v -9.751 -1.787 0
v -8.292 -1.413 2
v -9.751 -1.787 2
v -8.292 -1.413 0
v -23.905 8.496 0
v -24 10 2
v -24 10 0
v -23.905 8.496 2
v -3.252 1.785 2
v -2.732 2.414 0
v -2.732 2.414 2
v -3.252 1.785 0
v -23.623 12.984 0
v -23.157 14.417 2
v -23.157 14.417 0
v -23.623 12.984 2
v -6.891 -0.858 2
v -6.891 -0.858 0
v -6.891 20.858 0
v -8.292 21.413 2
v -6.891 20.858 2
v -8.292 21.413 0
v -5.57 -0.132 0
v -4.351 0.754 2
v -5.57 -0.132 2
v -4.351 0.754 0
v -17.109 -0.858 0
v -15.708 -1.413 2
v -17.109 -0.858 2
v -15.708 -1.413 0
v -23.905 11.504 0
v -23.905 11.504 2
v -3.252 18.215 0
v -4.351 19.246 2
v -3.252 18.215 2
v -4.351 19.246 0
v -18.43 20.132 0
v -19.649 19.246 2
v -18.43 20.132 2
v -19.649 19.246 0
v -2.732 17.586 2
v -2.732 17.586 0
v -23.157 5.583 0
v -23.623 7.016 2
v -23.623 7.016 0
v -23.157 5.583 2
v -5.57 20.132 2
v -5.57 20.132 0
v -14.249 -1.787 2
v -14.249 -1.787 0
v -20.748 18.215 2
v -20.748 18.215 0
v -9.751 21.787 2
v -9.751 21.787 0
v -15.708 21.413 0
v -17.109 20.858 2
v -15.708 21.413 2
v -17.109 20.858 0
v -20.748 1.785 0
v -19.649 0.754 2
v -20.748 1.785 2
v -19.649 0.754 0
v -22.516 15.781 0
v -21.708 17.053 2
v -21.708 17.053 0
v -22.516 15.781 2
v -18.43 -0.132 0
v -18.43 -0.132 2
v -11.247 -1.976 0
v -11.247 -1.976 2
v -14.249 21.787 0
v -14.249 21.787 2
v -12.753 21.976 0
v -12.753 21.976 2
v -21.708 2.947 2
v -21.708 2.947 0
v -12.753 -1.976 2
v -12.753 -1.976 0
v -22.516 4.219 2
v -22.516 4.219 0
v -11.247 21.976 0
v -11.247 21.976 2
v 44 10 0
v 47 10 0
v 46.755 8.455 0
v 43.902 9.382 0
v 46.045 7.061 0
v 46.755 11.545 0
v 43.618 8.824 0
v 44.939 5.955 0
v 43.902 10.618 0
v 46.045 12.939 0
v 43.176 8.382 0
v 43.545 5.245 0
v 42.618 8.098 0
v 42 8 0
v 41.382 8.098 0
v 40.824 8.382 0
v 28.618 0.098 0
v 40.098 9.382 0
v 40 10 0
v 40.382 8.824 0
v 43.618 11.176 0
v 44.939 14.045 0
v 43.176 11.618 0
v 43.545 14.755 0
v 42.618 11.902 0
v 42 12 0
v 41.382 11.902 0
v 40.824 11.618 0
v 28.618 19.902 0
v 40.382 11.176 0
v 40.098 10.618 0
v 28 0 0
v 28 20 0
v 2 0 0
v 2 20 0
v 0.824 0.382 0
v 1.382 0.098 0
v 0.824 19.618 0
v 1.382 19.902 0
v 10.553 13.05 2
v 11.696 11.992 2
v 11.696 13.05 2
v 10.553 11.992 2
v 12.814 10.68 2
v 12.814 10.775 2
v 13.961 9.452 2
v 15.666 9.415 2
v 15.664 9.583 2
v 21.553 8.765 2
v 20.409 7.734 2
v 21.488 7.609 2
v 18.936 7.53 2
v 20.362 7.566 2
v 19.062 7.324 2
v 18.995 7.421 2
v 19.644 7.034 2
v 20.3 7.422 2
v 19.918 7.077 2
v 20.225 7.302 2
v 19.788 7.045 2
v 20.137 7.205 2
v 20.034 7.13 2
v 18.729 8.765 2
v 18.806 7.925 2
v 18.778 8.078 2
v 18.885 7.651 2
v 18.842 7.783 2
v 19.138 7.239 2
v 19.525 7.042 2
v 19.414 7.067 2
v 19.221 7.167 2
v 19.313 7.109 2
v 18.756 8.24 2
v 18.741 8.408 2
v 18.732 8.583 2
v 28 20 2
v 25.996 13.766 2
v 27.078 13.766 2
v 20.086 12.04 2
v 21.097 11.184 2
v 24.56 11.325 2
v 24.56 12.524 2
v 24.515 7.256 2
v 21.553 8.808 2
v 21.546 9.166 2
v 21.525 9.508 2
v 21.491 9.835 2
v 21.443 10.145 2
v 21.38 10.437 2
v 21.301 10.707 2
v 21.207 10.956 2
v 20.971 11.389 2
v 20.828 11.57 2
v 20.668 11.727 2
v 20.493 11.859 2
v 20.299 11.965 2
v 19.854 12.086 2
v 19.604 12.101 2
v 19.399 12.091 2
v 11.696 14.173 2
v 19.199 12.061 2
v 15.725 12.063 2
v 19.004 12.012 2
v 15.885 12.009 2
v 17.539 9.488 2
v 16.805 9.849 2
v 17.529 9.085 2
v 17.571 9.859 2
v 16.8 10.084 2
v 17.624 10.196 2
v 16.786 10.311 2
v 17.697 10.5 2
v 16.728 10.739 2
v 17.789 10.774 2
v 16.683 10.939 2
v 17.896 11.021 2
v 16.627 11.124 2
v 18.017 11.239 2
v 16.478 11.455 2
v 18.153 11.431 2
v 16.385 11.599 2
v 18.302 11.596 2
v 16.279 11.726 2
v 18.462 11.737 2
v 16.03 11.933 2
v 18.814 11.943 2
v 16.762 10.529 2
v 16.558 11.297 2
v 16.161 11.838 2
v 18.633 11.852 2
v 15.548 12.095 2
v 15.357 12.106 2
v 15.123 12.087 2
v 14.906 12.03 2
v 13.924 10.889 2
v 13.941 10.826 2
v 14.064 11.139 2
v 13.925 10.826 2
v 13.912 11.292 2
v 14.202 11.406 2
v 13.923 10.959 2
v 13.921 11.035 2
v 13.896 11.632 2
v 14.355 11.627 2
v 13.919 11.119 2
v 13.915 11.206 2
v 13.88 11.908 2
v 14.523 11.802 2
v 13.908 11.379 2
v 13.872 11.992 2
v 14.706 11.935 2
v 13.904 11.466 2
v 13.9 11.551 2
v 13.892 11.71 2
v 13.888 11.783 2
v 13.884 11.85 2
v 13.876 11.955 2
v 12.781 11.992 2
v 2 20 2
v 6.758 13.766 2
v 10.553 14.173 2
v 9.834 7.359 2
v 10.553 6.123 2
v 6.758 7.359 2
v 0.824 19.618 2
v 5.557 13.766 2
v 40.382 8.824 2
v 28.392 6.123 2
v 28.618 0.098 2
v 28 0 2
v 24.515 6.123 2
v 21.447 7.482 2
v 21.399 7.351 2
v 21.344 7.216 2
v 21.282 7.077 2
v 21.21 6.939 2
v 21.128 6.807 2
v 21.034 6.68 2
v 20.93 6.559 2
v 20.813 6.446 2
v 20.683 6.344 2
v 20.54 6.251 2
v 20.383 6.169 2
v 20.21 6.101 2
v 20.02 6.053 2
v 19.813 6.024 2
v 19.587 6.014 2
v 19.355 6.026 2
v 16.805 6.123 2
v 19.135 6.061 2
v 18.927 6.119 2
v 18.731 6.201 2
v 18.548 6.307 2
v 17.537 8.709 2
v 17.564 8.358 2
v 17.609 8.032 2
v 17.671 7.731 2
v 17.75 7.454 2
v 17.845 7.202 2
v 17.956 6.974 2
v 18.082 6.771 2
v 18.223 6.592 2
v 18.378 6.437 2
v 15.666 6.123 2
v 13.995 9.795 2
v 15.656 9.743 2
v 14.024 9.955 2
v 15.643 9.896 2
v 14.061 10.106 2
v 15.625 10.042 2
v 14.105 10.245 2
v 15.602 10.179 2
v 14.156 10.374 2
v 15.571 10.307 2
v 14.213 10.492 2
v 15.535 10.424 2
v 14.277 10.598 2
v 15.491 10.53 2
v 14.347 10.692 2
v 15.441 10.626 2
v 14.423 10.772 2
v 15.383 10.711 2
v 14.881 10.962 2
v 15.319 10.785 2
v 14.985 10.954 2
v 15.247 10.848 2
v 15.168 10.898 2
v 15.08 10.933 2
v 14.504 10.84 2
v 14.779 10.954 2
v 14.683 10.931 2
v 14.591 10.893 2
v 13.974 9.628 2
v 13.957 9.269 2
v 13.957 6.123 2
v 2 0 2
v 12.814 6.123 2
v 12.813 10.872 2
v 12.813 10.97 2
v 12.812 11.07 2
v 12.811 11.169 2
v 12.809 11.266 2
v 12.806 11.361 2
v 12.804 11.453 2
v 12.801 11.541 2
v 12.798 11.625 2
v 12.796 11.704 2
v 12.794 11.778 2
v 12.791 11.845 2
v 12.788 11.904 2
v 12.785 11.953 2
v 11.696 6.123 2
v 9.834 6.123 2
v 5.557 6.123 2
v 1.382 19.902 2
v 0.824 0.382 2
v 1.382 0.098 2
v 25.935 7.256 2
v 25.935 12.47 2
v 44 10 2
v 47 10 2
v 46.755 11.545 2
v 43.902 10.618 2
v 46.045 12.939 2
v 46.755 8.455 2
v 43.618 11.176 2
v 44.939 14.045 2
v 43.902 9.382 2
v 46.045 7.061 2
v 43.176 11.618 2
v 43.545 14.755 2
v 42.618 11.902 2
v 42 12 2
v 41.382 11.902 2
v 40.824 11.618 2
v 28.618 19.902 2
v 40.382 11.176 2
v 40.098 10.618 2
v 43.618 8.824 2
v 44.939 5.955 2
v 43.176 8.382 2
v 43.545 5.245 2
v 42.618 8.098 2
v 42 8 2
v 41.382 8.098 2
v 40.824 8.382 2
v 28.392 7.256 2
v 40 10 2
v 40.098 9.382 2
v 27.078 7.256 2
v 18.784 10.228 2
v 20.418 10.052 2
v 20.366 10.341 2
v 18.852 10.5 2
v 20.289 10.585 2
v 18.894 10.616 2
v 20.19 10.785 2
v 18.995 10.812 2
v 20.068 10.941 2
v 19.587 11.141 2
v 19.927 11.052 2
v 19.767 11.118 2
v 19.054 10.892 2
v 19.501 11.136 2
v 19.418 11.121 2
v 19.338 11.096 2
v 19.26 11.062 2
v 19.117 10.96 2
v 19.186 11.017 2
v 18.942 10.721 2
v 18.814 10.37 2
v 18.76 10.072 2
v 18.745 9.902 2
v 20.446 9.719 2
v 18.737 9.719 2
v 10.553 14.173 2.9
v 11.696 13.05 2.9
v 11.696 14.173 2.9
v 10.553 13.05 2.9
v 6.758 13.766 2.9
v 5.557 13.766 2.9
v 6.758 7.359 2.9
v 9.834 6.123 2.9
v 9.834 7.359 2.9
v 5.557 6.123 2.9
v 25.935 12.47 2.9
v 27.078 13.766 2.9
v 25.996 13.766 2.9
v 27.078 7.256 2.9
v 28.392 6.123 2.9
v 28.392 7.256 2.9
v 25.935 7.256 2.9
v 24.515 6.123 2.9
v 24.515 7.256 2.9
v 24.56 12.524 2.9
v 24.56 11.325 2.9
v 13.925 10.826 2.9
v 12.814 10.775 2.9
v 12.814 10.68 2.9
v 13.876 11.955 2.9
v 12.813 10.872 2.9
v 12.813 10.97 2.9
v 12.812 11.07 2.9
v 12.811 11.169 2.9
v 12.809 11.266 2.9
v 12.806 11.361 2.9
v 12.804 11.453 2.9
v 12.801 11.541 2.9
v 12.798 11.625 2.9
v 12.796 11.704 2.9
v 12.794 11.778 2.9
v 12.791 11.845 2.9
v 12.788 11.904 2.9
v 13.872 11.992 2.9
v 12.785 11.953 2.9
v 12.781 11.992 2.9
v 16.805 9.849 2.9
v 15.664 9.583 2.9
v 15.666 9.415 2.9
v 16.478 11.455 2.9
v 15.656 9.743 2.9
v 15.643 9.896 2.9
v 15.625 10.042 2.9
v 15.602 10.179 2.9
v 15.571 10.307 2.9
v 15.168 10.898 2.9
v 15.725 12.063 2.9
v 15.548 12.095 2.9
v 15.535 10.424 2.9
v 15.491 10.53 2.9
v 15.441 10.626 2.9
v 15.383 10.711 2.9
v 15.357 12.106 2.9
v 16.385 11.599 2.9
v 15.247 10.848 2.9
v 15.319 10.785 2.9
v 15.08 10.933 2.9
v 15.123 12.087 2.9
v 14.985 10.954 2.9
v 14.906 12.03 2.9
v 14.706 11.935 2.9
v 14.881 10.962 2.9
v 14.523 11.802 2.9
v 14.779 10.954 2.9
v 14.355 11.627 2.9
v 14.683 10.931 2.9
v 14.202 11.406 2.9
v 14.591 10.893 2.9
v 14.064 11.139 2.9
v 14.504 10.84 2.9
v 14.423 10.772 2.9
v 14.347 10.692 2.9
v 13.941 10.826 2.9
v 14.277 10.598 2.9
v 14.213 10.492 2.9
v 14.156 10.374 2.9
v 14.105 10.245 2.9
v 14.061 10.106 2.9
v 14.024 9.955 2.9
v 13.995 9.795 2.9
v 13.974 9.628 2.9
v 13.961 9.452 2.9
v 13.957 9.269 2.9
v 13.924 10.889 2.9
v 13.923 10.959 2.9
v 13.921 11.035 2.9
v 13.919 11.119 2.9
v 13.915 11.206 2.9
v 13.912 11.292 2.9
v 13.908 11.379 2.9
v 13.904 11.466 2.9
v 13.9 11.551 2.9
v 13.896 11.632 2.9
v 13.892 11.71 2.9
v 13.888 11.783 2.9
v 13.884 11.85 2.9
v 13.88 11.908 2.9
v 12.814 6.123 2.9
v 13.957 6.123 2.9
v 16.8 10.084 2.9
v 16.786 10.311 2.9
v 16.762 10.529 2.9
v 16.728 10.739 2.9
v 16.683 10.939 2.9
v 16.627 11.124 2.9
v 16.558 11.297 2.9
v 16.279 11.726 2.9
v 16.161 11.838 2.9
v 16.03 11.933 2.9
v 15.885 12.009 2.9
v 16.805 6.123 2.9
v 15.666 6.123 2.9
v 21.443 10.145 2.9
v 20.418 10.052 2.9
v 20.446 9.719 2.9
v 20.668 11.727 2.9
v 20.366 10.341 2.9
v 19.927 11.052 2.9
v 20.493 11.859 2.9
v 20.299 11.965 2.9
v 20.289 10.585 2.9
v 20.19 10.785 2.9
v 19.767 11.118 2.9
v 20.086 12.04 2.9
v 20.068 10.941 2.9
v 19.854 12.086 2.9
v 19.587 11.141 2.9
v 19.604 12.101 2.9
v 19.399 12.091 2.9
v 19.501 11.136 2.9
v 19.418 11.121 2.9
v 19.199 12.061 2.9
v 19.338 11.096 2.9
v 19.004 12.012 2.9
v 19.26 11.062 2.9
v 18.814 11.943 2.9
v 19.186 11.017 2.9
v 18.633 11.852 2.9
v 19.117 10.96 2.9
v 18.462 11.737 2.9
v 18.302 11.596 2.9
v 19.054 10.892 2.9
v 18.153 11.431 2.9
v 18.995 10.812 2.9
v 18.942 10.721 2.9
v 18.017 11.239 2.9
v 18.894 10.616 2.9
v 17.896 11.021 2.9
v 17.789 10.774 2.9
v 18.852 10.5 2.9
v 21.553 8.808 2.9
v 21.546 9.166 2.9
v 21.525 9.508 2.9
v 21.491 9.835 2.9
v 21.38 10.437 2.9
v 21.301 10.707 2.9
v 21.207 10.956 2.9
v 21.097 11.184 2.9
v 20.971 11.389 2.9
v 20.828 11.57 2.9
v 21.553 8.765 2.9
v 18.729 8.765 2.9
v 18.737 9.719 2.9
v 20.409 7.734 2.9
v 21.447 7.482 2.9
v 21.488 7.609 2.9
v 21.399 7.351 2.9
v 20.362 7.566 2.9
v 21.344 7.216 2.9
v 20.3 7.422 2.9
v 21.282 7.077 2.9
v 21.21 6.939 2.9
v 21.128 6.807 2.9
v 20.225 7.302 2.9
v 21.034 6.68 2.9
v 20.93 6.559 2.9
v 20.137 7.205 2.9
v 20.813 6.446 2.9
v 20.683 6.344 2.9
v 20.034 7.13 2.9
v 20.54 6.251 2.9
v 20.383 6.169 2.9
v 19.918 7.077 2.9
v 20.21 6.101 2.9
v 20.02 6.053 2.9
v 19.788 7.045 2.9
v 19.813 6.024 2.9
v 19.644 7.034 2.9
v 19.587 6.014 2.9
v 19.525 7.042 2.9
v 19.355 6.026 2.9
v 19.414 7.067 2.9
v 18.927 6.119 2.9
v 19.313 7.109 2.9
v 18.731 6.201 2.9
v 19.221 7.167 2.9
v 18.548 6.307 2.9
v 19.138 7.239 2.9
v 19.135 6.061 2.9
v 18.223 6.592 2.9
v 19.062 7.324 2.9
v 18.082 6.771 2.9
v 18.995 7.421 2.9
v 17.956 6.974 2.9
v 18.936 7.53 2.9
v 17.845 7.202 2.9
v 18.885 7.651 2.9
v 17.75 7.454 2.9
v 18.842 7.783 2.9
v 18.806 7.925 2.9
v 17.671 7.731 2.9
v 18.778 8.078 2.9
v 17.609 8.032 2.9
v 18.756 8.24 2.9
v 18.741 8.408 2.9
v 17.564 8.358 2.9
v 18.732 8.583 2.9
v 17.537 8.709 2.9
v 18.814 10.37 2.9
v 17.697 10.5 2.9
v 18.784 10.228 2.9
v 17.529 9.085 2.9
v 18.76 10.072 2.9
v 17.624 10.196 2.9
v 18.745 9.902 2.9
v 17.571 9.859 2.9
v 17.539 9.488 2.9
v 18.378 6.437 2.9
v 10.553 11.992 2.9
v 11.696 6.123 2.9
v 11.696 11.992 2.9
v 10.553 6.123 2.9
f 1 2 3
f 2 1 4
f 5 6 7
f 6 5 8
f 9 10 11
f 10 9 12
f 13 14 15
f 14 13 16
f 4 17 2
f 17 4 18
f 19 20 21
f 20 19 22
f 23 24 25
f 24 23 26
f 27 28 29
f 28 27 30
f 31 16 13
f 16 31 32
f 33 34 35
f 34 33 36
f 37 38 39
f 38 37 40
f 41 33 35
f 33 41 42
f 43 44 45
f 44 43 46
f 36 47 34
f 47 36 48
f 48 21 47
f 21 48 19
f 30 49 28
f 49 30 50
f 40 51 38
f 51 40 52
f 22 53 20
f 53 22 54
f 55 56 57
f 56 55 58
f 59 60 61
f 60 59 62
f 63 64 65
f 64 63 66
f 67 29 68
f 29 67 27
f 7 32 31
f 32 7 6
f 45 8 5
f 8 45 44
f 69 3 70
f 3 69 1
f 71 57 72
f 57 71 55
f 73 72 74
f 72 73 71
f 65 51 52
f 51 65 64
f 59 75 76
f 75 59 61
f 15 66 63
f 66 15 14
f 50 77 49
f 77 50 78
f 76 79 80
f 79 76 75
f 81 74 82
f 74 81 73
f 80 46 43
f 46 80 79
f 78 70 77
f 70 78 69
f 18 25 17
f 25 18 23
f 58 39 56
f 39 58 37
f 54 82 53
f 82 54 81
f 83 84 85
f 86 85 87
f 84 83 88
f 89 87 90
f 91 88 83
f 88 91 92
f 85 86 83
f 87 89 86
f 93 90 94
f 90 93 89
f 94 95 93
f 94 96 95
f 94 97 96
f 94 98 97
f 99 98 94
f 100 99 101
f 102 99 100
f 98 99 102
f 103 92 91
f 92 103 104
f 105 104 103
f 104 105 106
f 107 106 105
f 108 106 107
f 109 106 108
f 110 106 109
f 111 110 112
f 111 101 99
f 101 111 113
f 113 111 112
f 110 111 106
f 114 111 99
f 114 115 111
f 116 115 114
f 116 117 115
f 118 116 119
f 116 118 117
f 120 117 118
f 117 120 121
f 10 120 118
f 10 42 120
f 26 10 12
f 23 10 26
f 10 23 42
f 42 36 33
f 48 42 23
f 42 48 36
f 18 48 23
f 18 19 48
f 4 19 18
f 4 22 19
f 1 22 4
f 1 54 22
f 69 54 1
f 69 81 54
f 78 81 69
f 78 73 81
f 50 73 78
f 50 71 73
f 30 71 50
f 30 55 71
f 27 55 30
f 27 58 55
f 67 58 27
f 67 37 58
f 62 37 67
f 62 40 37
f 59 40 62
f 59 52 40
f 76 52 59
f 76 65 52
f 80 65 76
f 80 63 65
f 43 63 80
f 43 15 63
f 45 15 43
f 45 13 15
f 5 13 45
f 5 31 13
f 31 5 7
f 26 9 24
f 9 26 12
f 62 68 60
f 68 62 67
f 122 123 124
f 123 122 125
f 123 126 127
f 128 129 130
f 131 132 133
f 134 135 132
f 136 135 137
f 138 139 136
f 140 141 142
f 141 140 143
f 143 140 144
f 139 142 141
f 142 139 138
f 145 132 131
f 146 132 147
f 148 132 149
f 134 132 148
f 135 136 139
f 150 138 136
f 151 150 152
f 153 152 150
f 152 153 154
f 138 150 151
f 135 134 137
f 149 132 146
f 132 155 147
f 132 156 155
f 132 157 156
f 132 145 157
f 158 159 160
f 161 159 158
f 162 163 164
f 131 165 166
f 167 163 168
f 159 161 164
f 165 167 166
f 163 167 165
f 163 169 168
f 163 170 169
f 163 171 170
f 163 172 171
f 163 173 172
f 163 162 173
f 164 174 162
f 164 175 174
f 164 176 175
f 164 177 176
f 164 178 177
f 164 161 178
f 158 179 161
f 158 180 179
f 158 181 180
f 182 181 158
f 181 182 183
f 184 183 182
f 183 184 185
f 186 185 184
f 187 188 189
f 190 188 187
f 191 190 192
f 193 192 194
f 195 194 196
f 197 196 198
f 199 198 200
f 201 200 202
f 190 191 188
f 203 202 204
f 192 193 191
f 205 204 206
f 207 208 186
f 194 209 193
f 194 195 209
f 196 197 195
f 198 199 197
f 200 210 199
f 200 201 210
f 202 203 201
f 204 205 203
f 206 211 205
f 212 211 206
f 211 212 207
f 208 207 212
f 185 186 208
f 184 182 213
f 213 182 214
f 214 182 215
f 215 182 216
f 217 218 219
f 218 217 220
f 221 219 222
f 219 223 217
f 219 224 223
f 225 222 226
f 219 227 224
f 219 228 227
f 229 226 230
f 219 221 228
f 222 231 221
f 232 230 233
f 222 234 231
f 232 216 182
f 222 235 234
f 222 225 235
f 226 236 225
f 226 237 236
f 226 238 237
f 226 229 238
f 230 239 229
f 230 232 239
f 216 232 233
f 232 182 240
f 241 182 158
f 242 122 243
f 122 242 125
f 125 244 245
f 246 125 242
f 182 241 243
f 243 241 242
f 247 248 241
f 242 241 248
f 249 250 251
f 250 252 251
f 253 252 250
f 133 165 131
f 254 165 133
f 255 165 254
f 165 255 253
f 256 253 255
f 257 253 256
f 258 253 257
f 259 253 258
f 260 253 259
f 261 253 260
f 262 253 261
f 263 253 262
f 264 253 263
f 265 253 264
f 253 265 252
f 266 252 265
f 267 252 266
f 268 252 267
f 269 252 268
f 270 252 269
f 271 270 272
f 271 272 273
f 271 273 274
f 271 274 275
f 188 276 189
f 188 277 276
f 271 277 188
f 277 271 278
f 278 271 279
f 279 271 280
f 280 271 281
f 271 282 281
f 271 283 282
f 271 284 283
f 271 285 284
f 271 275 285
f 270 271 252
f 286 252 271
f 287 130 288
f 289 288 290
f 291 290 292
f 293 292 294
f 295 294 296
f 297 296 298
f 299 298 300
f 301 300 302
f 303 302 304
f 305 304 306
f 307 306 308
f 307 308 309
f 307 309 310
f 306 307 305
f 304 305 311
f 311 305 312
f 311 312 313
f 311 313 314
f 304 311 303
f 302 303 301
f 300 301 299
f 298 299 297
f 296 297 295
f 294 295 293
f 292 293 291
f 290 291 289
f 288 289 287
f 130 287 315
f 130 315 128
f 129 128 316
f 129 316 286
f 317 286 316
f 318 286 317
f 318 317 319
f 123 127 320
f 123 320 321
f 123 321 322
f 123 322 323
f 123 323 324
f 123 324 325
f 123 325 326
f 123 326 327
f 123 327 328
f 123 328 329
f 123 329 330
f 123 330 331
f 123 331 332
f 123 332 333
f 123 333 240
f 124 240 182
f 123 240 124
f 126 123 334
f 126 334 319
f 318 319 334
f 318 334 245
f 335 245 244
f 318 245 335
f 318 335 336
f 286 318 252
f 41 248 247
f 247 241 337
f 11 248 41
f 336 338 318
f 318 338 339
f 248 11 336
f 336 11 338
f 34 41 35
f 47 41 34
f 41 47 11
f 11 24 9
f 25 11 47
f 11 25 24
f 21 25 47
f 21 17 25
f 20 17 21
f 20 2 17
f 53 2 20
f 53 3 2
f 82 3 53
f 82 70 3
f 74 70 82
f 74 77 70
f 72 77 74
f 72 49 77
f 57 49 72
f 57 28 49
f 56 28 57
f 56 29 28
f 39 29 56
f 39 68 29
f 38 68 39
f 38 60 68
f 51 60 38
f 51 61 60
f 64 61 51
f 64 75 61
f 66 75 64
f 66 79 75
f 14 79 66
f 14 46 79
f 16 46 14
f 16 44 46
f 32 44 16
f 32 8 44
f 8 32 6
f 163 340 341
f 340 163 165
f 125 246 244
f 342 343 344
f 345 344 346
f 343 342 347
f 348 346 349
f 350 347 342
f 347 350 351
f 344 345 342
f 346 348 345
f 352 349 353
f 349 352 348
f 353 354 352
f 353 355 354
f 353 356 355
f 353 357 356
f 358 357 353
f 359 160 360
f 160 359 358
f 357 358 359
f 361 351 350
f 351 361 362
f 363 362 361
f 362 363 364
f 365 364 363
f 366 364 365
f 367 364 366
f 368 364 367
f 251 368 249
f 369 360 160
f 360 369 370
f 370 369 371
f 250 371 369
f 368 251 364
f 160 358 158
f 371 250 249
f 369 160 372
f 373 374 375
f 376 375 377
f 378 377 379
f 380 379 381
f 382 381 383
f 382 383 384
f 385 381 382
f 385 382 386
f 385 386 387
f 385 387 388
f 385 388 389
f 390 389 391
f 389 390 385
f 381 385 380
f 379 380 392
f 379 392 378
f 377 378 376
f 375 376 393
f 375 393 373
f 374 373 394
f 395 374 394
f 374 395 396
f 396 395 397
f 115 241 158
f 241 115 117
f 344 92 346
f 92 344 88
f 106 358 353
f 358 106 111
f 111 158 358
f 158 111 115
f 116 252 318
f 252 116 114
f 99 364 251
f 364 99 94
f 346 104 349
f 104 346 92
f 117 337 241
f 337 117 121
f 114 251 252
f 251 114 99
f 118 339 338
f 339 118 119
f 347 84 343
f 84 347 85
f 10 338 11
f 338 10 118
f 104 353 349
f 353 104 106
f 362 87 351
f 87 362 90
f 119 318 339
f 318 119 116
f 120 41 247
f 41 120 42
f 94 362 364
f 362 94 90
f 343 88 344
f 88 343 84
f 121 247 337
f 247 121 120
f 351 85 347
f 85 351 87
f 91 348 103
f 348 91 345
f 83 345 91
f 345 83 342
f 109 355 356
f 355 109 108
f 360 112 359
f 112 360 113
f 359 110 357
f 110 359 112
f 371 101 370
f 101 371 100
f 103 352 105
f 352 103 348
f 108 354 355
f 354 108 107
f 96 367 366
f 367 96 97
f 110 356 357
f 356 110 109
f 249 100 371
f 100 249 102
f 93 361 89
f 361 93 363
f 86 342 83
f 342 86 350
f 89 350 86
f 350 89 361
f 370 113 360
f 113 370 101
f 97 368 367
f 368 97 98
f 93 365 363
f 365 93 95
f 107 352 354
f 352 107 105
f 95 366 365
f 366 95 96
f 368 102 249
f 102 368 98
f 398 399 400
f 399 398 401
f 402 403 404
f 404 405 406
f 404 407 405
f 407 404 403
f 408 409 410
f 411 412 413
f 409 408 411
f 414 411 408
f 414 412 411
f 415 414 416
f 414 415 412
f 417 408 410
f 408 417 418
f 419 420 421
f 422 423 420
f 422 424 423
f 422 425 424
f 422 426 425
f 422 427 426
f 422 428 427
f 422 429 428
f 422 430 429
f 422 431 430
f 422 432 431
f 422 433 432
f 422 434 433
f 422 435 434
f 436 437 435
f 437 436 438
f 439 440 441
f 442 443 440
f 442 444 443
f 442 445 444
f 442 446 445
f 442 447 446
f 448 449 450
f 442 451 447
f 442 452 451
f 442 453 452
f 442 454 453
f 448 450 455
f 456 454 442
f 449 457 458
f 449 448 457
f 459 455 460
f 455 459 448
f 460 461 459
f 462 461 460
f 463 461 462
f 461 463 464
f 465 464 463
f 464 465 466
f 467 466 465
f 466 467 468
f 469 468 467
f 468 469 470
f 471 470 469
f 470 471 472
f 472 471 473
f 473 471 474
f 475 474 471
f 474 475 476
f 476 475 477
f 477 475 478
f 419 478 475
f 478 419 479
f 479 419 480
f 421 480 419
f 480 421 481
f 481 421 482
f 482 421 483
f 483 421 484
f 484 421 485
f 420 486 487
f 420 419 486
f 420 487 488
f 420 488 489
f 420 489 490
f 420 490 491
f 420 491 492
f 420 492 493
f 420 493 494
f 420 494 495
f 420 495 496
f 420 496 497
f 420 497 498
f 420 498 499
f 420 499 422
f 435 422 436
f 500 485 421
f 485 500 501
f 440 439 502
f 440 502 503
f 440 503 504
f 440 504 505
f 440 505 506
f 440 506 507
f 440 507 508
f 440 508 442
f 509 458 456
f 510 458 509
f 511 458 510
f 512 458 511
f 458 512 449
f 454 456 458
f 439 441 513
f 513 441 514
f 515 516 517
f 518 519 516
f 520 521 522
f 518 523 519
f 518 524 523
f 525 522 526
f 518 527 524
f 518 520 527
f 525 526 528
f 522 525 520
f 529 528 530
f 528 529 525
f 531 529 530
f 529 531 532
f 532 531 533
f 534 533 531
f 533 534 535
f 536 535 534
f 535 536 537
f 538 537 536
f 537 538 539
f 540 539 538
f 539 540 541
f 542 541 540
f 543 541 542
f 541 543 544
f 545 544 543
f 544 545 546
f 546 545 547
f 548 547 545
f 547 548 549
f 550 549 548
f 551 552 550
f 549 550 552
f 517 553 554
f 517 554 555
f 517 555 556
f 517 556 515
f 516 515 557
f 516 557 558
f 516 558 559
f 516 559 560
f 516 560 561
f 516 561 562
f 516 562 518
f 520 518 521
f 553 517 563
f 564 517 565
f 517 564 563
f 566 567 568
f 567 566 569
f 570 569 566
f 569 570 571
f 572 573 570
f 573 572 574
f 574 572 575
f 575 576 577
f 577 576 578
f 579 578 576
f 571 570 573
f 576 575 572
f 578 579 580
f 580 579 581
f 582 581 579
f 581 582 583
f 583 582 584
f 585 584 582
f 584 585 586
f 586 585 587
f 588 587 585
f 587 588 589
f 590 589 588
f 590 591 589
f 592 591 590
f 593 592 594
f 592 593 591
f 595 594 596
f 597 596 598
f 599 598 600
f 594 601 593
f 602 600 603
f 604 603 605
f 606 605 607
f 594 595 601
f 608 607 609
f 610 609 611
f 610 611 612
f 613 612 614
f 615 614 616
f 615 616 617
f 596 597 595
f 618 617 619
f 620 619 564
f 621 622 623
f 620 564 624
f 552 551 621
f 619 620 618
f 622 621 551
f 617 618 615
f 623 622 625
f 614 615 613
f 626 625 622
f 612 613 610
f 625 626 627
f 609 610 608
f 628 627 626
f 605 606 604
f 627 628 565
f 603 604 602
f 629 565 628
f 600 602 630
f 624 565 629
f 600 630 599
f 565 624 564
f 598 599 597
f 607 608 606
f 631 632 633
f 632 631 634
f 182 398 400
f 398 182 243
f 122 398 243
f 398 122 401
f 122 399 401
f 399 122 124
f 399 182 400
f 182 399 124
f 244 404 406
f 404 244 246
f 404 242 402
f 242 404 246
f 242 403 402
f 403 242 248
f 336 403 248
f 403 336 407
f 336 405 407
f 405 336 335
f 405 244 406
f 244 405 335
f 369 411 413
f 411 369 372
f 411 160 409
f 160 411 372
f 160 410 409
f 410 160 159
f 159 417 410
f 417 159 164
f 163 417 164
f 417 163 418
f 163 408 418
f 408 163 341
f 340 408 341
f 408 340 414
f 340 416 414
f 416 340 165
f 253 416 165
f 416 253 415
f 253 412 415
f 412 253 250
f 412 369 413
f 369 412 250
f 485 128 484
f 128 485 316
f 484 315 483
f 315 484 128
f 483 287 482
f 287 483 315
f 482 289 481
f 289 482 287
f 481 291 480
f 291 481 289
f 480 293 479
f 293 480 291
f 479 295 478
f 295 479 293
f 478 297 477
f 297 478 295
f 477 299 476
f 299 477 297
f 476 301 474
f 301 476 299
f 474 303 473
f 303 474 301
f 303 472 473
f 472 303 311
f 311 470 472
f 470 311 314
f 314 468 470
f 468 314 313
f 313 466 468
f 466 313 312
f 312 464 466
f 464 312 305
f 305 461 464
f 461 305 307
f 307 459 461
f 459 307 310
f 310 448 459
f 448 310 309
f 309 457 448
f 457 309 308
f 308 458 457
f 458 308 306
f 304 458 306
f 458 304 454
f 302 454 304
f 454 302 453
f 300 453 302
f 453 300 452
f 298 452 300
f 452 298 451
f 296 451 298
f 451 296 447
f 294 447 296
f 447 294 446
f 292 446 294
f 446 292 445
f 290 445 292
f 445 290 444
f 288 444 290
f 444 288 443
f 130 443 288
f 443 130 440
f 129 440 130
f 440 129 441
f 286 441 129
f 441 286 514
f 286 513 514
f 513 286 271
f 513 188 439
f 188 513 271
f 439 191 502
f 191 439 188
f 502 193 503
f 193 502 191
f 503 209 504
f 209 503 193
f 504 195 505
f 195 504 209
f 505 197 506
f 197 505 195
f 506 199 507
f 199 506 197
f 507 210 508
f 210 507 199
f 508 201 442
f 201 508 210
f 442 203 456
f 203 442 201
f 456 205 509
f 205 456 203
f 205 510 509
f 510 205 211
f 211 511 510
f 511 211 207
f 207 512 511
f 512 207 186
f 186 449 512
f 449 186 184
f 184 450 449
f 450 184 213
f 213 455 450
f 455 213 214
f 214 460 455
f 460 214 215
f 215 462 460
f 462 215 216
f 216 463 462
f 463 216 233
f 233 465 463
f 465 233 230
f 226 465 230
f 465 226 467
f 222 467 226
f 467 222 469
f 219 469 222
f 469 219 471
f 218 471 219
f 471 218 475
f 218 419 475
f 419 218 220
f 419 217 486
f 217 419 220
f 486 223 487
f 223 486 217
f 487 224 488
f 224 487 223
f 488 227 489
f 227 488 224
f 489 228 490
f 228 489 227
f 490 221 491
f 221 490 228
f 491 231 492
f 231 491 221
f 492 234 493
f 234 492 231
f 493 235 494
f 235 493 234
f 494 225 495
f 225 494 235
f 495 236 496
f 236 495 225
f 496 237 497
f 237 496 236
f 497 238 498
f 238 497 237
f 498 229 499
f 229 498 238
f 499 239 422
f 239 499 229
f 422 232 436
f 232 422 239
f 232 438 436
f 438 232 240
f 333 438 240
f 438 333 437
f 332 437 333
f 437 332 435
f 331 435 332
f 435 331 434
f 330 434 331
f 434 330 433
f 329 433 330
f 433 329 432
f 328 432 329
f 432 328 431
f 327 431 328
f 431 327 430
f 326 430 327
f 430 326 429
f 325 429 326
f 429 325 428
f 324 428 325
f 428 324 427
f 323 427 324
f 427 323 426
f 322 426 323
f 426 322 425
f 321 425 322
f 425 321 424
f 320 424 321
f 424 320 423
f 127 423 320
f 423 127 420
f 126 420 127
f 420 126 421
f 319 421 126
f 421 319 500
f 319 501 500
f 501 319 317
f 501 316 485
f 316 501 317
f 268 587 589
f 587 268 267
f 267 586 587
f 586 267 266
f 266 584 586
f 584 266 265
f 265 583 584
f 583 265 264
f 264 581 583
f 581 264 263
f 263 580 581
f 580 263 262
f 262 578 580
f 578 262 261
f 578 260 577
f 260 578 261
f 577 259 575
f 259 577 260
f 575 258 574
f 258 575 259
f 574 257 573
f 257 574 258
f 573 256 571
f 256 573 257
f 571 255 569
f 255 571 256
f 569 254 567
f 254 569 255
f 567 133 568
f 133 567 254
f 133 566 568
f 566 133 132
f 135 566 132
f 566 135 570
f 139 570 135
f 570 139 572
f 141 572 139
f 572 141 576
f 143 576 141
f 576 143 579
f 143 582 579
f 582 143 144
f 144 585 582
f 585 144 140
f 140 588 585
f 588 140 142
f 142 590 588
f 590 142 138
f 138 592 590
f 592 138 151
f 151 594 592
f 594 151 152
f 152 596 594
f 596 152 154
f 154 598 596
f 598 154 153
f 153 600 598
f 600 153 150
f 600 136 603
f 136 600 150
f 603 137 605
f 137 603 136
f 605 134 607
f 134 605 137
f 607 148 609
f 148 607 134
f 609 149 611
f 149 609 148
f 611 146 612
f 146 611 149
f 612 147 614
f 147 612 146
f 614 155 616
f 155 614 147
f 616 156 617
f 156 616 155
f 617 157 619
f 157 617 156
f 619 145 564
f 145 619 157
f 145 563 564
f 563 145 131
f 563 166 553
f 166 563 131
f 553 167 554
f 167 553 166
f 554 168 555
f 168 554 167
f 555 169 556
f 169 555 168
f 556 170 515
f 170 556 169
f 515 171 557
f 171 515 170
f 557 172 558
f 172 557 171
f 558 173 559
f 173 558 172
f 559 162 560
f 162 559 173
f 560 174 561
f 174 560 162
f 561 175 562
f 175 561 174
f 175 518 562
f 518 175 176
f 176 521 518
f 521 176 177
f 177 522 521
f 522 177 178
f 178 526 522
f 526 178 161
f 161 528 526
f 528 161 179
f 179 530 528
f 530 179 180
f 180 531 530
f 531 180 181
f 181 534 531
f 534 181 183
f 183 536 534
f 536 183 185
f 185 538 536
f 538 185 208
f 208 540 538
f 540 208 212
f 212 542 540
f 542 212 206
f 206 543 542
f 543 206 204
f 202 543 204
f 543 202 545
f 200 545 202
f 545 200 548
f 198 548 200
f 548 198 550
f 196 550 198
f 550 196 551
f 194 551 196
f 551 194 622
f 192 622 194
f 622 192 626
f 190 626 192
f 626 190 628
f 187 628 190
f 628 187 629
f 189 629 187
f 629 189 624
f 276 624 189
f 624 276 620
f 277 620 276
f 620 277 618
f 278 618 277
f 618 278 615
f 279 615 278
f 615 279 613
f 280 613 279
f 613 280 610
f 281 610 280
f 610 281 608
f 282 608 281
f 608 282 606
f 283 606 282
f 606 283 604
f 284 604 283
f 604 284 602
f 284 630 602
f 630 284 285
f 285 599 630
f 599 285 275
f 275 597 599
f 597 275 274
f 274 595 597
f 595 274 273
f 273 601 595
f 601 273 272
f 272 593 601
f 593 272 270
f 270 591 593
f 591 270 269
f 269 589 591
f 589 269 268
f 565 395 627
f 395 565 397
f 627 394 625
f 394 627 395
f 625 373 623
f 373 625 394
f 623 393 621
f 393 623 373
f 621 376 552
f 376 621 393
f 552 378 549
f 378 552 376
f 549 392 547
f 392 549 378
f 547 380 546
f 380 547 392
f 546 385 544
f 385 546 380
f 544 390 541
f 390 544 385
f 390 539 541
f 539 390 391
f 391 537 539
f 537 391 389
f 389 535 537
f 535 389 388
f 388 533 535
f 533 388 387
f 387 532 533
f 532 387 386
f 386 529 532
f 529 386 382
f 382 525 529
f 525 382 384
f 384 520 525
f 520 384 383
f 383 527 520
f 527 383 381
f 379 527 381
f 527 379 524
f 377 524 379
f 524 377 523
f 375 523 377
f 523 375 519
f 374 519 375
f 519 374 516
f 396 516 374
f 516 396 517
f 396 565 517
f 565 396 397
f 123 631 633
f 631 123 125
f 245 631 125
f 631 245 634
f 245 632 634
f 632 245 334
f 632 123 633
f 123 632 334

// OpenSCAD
width = 20;
length1 = 30; // Defaults to 30 for mode 1 and 20 for mode 2
length2 = length1 + 12;
height = 2;
text_height = 1;
radius = 2;
radius2 = 5;
radius_coin = 12;
line1 = "Line 1";
text_scale = 0.8; // Defaults to 0.8
text_scale_width = 0.6; // Defaults to 0.6 
font="Liberation Sans:style=bold";
mode = 1; // 1 = add, 2 = sub

difference() {
    union()
    {
        // coin
        translate([-radius_coin,width / 2,0]) cylinder(height, radius_coin, radius_coin, $fn=50);
        // body
        hull() {
            translate([-radius_coin,width / 2,0]) cylinder(height, radius, radius, $fn=20);
            translate([radius,radius,0]) cylinder(height, radius, radius, $fn=20);
            translate([radius,width-radius,0]) cylinder(height, radius, radius, $fn=20);
            translate([length1-radius,radius,0]) cylinder(height, radius, radius, $fn=20);
            translate([length1-radius,width-radius,0]) cylinder(height, radius, radius, $fn=20);
            // outer cylinder for keyring
            translate([length2,width / 2,0]) cylinder(height, radius2, radius2, $fn=20);
        }
    }
    // Cut out hole for key ring
    translate([length2,width / 2,0]) cylinder(10, radius, radius, true, $fn=20);
    if(mode == 2) {
        // Text for mode 2
        translate([-radius_coin*1.2,width/2,1]) linear_extrude(height = height+1) {
            scale([text_scale_width, text_scale, text_scale]) text(line1, valign = "center", font=font);
        }
    }
}
if(mode == 1) {
    // Text for mode 1
    translate([5,width/2,height-0.1]) linear_extrude(height = text_height) {
        scale([text_scale_width, text_scale, text_scale]) text(line1, valign = "center", font=font);
    }
}
